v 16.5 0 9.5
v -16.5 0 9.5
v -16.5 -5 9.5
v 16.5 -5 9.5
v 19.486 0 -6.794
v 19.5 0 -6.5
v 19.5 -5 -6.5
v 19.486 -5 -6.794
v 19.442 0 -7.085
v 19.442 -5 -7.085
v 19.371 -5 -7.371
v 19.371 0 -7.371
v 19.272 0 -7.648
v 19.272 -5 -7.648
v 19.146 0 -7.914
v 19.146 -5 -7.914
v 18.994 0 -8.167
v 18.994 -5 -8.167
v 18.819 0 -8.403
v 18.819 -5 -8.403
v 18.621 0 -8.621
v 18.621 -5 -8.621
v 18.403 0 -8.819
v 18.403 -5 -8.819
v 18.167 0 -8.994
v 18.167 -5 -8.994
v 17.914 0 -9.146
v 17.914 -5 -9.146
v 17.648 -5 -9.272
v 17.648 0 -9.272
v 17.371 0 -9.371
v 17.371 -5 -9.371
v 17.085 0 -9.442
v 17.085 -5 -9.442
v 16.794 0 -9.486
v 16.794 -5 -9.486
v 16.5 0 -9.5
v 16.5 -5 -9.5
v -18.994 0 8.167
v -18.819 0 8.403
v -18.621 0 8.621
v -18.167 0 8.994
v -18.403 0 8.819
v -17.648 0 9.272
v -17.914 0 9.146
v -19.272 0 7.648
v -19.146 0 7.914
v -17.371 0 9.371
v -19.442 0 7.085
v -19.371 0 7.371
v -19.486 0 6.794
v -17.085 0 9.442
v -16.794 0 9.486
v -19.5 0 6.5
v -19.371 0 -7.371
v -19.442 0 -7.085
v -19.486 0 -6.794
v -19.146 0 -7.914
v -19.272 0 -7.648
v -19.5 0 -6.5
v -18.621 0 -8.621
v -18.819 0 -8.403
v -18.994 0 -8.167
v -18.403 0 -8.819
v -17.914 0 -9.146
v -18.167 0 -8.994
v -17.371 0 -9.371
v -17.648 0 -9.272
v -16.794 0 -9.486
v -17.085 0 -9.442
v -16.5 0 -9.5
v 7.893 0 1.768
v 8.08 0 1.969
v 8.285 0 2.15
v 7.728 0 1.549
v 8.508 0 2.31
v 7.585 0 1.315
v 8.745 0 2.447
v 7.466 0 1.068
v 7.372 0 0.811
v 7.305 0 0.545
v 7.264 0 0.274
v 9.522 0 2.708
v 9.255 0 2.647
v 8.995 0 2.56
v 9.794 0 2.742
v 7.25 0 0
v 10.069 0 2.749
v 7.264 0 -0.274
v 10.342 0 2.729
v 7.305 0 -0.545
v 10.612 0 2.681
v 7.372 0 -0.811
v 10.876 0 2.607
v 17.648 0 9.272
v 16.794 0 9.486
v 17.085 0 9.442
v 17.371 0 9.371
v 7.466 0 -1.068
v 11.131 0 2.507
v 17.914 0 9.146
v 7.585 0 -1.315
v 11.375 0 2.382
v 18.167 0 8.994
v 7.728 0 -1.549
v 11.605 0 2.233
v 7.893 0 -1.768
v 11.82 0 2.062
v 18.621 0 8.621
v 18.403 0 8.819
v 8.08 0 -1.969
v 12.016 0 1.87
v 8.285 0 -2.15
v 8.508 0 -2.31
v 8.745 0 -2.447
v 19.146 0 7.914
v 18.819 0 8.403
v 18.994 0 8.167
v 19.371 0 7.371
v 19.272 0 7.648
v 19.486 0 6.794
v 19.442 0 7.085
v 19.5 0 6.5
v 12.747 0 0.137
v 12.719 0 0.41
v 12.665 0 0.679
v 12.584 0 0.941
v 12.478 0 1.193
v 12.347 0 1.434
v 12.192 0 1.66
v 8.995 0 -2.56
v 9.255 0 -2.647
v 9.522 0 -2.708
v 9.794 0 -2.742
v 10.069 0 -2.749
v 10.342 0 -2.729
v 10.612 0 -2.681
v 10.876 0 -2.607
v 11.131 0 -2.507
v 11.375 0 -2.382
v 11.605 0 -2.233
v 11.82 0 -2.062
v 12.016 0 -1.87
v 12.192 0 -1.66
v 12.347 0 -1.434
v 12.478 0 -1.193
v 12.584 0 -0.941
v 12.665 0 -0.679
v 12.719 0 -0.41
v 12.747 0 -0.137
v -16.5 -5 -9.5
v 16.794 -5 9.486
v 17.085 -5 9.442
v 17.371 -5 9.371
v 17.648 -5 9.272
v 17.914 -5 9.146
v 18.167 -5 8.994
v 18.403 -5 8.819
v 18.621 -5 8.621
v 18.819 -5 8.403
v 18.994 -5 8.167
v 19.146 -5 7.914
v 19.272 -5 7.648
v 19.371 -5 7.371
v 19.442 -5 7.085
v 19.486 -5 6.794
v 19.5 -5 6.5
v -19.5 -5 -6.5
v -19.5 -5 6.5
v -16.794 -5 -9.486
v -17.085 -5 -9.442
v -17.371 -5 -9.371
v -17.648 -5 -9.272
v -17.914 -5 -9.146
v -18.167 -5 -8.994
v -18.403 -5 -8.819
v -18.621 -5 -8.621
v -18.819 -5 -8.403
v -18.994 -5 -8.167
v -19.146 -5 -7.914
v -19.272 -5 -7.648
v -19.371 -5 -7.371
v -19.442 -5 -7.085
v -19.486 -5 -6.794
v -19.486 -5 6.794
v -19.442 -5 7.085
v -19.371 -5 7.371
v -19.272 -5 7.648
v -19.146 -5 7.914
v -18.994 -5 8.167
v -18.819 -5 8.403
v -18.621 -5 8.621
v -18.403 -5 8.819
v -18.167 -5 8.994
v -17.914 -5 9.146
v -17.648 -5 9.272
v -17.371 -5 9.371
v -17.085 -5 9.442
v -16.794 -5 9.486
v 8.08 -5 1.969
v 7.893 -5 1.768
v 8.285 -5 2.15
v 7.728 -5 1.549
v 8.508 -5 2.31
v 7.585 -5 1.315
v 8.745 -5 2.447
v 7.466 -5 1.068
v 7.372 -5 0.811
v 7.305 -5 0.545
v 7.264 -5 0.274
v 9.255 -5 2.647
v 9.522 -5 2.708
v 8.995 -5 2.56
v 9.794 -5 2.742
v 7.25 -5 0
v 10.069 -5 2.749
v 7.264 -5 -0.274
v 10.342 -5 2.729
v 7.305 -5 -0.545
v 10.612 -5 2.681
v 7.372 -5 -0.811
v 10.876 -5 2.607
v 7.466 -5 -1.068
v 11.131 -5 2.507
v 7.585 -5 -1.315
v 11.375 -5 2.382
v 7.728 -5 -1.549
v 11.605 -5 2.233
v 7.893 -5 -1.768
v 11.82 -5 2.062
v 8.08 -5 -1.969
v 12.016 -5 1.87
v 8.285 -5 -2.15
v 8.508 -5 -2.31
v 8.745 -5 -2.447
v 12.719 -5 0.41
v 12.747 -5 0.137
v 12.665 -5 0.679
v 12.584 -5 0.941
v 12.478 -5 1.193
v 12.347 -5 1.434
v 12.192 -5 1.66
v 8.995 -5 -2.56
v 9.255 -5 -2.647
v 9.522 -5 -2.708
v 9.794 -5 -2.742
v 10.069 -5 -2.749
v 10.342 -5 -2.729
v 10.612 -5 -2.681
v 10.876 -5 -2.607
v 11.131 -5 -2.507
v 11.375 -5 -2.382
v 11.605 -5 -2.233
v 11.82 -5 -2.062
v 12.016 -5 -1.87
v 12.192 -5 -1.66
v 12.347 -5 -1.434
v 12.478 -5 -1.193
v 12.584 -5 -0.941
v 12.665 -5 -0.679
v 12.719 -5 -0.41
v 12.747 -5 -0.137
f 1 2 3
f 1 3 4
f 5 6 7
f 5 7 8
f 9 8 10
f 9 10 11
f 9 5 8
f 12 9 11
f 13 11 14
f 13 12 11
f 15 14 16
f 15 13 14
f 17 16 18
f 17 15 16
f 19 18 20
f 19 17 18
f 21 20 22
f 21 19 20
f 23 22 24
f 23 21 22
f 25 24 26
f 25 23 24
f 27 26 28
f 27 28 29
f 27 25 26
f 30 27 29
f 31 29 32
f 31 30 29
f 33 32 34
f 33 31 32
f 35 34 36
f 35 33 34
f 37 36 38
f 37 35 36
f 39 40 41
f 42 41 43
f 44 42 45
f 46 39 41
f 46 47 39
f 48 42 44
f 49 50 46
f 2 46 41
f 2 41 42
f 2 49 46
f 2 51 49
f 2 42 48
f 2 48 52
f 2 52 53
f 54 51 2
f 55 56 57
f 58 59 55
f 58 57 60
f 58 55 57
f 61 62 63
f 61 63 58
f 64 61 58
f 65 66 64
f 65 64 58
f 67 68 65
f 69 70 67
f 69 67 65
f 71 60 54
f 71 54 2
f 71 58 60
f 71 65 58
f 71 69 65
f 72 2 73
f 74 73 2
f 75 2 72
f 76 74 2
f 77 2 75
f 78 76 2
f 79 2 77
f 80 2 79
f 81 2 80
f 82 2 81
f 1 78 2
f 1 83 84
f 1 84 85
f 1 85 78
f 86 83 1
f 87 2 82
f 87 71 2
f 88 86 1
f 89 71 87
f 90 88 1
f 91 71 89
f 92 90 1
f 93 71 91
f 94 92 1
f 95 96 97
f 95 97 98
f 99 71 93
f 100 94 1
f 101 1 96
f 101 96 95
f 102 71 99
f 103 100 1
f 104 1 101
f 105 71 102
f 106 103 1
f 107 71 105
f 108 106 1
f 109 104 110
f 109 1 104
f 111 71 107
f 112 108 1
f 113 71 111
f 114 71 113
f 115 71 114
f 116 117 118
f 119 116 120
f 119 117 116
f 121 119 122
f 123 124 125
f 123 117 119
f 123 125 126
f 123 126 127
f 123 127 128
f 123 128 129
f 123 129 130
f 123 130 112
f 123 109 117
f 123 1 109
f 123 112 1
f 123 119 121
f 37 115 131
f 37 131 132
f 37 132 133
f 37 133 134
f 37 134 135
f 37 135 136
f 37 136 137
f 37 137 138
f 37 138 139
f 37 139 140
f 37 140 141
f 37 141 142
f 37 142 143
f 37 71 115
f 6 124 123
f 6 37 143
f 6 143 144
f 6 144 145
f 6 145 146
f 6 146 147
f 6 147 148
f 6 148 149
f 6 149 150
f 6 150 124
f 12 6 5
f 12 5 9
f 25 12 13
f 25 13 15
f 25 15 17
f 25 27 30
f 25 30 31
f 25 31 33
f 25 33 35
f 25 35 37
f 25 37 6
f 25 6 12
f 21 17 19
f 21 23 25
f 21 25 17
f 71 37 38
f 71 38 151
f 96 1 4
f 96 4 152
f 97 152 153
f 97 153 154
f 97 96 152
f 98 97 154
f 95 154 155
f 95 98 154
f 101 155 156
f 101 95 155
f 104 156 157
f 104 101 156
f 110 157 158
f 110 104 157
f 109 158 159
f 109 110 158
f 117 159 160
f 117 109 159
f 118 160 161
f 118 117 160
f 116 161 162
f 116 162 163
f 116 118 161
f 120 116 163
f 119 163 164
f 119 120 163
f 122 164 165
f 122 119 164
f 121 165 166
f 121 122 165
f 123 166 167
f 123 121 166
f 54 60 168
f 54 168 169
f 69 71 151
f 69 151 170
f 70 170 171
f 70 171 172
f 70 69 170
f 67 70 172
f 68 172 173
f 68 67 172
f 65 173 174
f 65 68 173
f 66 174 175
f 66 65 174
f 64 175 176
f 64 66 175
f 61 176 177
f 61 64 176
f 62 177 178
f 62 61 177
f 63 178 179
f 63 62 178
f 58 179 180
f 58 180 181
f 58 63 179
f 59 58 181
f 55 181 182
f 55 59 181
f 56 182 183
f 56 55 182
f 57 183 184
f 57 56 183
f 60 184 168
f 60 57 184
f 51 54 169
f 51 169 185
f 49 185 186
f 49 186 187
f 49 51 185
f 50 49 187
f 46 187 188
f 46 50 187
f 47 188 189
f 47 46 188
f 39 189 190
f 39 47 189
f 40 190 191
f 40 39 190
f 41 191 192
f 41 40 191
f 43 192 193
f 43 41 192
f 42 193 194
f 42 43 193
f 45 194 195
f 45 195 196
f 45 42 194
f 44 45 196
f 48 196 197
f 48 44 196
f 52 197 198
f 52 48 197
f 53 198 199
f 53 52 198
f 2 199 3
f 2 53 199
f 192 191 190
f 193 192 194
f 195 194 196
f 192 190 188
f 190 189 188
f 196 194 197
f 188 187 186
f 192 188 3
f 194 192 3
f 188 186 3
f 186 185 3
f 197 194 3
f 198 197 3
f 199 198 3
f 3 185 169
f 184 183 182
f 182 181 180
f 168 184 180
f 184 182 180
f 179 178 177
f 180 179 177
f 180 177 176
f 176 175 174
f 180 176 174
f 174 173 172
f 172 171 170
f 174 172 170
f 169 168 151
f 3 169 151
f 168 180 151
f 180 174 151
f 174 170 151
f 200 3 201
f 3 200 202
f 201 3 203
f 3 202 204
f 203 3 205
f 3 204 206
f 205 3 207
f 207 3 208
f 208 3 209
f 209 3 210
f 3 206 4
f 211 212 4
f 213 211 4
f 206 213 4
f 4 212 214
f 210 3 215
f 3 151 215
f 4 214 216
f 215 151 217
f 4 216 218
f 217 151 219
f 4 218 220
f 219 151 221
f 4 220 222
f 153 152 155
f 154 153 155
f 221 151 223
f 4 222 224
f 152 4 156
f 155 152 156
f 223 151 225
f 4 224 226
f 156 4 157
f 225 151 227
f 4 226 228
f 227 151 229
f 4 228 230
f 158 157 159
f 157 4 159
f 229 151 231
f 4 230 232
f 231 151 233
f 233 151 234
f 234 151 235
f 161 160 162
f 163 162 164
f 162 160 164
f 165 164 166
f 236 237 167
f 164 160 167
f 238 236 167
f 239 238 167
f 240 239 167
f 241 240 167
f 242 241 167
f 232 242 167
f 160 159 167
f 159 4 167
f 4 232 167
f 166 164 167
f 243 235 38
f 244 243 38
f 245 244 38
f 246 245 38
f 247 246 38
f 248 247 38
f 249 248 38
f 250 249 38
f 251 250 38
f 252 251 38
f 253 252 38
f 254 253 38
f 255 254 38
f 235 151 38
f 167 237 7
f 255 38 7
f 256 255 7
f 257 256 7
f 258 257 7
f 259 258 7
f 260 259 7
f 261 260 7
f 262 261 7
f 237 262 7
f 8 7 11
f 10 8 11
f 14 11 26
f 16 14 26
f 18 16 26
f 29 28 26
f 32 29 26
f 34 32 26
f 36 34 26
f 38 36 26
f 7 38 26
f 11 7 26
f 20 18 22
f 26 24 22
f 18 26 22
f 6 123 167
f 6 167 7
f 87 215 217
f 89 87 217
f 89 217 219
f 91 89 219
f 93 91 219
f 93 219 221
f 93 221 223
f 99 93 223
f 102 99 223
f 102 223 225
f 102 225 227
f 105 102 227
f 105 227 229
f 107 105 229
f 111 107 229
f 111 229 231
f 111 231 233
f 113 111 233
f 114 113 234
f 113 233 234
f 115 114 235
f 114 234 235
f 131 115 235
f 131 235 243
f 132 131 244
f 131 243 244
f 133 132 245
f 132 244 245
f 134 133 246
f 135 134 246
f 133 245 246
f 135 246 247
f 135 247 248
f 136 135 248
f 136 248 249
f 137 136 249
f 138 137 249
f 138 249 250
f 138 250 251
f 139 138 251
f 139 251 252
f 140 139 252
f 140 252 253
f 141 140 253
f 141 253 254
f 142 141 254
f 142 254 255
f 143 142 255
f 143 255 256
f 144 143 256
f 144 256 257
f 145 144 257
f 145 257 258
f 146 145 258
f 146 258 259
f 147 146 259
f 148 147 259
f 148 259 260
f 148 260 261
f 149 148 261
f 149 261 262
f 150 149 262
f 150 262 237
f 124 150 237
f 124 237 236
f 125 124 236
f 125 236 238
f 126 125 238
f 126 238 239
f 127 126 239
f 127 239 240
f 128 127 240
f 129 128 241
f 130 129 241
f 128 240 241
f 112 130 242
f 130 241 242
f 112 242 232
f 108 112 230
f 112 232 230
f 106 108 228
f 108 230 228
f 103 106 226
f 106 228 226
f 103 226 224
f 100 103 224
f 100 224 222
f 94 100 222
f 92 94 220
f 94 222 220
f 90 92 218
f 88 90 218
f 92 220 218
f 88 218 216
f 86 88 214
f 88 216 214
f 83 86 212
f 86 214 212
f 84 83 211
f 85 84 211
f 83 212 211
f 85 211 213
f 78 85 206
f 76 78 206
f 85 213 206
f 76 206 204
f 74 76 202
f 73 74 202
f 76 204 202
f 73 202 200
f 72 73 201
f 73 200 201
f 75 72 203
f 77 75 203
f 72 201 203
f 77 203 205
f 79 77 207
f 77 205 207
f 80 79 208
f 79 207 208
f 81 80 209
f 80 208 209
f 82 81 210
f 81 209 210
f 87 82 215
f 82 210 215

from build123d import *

# Parameters (mm, degrees)
PROFILE_DEPTH = 5
M5_HOLE_D     = 5.5


with BuildPart() as part:
    # Profile Sketch → Profile (new body)
    with BuildSketch(Plane(origin=(0, 0, 0), x_dir=(1, 0, 0), z_dir=(0, 1, 0))):
        with BuildLine():
            Line((-16.5, -9.5), (16.5, -9.5))
            ThreePointArc((16.5, -9.5), (18.621320344, -8.621320344), (19.5, -6.5))
            Line((19.5, -6.5), (19.5, 6.5))
            ThreePointArc((19.5, 6.5), (18.621320344, 8.621320344), (16.5, 9.5))
            Line((16.5, 9.5), (-16.5, 9.5))
            ThreePointArc((-16.5, 9.5), (-18.621320344, 8.621320344), (-19.5, 6.5))
            Line((-19.5, 6.5), (-19.5, -6.5))
            ThreePointArc((-19.5, -6.5), (-18.621320344, -8.621320344), (-16.5, -9.5))
        make_face()
    extrude(amount=-PROFILE_DEPTH)

    # M5 Hole (through all)
    with Locations(Plane(origin=(0, 0, 0), x_dir=(1, 0, 0), z_dir=(0, 1, 0))):
        with Locations((10, 0)):
            Hole(M5_HOLE_D / 2)


solid = part.part
